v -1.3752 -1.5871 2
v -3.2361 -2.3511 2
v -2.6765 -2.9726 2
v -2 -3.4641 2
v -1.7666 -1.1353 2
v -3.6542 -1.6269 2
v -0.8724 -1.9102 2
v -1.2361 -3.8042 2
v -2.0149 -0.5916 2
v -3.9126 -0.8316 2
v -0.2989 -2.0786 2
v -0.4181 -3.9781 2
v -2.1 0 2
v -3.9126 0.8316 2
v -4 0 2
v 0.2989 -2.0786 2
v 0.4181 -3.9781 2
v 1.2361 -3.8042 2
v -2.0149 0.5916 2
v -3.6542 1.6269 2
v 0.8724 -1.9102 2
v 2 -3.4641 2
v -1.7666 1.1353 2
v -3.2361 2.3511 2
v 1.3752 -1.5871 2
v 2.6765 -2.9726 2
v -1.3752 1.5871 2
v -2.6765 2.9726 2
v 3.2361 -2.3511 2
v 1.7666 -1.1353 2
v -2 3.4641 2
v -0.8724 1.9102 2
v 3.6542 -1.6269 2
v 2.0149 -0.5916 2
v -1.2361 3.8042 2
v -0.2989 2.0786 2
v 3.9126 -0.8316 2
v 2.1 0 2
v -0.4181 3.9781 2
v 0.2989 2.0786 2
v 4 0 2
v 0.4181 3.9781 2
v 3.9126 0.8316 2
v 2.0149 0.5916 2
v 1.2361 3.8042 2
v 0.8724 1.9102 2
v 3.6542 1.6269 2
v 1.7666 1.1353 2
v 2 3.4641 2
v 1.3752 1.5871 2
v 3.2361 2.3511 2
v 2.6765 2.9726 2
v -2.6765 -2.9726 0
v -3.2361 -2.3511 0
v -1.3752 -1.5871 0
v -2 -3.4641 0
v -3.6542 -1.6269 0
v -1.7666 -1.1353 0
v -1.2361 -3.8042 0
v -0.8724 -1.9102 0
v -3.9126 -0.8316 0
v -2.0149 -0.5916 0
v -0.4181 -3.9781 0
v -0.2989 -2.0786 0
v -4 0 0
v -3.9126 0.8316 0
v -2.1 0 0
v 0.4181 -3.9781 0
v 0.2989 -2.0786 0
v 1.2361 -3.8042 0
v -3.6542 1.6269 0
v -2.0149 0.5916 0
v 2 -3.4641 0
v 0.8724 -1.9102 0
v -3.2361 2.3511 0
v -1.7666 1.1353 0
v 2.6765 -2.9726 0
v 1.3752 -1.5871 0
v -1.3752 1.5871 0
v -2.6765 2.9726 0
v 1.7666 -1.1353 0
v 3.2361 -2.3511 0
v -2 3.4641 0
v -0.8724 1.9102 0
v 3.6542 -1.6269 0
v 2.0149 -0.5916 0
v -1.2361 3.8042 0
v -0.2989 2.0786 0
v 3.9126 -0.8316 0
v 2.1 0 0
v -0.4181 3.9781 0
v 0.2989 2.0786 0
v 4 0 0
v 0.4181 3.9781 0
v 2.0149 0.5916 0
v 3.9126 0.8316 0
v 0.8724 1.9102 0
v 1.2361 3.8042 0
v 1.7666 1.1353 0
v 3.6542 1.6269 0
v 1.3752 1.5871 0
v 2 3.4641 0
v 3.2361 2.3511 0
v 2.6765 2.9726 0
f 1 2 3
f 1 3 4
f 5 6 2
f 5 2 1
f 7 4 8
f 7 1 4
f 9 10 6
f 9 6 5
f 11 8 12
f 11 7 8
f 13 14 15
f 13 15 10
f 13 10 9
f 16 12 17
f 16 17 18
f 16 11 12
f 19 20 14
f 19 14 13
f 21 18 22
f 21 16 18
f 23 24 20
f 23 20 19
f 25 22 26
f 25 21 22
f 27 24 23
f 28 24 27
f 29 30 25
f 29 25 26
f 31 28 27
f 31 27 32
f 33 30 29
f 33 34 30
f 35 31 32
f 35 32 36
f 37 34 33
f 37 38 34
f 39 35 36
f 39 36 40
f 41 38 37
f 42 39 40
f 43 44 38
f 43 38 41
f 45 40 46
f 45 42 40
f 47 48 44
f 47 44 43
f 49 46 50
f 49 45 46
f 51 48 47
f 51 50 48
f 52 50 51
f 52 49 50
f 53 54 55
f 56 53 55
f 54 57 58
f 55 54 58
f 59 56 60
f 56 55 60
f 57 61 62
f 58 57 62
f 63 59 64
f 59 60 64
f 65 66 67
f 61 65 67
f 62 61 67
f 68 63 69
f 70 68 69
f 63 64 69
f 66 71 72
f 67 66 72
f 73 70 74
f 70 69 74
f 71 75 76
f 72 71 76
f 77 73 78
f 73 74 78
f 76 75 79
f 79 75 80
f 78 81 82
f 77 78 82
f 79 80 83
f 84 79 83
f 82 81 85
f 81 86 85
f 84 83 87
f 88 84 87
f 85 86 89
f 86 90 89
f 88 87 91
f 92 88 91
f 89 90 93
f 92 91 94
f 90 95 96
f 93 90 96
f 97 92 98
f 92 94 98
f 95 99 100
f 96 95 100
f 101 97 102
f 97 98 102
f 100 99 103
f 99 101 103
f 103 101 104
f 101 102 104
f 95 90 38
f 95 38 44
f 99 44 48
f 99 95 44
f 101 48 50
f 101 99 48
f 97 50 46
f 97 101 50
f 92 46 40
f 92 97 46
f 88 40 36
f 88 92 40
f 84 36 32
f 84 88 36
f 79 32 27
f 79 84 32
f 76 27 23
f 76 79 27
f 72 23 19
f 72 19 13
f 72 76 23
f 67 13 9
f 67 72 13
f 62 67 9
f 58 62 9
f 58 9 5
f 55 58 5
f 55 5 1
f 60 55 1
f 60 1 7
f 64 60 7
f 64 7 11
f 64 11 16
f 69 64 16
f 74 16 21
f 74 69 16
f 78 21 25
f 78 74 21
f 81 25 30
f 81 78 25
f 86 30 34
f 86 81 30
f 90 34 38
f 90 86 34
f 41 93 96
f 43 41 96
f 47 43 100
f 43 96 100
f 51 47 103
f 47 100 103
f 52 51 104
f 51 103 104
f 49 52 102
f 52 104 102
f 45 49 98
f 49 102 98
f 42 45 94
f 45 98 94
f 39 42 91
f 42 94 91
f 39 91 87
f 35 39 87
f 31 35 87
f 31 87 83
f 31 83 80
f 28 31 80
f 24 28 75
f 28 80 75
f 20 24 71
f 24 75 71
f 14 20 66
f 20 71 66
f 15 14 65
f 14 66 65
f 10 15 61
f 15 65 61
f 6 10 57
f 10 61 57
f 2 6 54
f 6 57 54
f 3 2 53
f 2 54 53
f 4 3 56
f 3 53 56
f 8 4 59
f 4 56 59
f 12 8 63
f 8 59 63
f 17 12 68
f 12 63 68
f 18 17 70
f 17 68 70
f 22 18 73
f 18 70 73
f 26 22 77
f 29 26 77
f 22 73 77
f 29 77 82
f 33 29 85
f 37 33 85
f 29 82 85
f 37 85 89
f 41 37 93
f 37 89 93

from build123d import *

# Parameters (mm, degrees)
CYLINDER029_R     = 2.1
CYLINDER029_DEPTH = 2
CYLINDER028_R     = 4
CYLINDER028_DEPTH = 2


with BuildPart() as cylinder029:
    # Cylinder029 → Cylinder029 (new body)
    with BuildSketch(Plane.XY):
        Circle(CYLINDER029_R)
    extrude(amount=CYLINDER029_DEPTH)


with BuildPart() as spacer:
    # Cylinder028 → Cylinder028 (new body)
    with BuildSketch(Plane.XY):
        Circle(CYLINDER028_R)
    extrude(amount=CYLINDER028_DEPTH)

    # Cut028006004005011004003001010002018: cut Cylinder029
    add(cylinder029.part, mode=Mode.SUBTRACT)


solid = spacer.part
